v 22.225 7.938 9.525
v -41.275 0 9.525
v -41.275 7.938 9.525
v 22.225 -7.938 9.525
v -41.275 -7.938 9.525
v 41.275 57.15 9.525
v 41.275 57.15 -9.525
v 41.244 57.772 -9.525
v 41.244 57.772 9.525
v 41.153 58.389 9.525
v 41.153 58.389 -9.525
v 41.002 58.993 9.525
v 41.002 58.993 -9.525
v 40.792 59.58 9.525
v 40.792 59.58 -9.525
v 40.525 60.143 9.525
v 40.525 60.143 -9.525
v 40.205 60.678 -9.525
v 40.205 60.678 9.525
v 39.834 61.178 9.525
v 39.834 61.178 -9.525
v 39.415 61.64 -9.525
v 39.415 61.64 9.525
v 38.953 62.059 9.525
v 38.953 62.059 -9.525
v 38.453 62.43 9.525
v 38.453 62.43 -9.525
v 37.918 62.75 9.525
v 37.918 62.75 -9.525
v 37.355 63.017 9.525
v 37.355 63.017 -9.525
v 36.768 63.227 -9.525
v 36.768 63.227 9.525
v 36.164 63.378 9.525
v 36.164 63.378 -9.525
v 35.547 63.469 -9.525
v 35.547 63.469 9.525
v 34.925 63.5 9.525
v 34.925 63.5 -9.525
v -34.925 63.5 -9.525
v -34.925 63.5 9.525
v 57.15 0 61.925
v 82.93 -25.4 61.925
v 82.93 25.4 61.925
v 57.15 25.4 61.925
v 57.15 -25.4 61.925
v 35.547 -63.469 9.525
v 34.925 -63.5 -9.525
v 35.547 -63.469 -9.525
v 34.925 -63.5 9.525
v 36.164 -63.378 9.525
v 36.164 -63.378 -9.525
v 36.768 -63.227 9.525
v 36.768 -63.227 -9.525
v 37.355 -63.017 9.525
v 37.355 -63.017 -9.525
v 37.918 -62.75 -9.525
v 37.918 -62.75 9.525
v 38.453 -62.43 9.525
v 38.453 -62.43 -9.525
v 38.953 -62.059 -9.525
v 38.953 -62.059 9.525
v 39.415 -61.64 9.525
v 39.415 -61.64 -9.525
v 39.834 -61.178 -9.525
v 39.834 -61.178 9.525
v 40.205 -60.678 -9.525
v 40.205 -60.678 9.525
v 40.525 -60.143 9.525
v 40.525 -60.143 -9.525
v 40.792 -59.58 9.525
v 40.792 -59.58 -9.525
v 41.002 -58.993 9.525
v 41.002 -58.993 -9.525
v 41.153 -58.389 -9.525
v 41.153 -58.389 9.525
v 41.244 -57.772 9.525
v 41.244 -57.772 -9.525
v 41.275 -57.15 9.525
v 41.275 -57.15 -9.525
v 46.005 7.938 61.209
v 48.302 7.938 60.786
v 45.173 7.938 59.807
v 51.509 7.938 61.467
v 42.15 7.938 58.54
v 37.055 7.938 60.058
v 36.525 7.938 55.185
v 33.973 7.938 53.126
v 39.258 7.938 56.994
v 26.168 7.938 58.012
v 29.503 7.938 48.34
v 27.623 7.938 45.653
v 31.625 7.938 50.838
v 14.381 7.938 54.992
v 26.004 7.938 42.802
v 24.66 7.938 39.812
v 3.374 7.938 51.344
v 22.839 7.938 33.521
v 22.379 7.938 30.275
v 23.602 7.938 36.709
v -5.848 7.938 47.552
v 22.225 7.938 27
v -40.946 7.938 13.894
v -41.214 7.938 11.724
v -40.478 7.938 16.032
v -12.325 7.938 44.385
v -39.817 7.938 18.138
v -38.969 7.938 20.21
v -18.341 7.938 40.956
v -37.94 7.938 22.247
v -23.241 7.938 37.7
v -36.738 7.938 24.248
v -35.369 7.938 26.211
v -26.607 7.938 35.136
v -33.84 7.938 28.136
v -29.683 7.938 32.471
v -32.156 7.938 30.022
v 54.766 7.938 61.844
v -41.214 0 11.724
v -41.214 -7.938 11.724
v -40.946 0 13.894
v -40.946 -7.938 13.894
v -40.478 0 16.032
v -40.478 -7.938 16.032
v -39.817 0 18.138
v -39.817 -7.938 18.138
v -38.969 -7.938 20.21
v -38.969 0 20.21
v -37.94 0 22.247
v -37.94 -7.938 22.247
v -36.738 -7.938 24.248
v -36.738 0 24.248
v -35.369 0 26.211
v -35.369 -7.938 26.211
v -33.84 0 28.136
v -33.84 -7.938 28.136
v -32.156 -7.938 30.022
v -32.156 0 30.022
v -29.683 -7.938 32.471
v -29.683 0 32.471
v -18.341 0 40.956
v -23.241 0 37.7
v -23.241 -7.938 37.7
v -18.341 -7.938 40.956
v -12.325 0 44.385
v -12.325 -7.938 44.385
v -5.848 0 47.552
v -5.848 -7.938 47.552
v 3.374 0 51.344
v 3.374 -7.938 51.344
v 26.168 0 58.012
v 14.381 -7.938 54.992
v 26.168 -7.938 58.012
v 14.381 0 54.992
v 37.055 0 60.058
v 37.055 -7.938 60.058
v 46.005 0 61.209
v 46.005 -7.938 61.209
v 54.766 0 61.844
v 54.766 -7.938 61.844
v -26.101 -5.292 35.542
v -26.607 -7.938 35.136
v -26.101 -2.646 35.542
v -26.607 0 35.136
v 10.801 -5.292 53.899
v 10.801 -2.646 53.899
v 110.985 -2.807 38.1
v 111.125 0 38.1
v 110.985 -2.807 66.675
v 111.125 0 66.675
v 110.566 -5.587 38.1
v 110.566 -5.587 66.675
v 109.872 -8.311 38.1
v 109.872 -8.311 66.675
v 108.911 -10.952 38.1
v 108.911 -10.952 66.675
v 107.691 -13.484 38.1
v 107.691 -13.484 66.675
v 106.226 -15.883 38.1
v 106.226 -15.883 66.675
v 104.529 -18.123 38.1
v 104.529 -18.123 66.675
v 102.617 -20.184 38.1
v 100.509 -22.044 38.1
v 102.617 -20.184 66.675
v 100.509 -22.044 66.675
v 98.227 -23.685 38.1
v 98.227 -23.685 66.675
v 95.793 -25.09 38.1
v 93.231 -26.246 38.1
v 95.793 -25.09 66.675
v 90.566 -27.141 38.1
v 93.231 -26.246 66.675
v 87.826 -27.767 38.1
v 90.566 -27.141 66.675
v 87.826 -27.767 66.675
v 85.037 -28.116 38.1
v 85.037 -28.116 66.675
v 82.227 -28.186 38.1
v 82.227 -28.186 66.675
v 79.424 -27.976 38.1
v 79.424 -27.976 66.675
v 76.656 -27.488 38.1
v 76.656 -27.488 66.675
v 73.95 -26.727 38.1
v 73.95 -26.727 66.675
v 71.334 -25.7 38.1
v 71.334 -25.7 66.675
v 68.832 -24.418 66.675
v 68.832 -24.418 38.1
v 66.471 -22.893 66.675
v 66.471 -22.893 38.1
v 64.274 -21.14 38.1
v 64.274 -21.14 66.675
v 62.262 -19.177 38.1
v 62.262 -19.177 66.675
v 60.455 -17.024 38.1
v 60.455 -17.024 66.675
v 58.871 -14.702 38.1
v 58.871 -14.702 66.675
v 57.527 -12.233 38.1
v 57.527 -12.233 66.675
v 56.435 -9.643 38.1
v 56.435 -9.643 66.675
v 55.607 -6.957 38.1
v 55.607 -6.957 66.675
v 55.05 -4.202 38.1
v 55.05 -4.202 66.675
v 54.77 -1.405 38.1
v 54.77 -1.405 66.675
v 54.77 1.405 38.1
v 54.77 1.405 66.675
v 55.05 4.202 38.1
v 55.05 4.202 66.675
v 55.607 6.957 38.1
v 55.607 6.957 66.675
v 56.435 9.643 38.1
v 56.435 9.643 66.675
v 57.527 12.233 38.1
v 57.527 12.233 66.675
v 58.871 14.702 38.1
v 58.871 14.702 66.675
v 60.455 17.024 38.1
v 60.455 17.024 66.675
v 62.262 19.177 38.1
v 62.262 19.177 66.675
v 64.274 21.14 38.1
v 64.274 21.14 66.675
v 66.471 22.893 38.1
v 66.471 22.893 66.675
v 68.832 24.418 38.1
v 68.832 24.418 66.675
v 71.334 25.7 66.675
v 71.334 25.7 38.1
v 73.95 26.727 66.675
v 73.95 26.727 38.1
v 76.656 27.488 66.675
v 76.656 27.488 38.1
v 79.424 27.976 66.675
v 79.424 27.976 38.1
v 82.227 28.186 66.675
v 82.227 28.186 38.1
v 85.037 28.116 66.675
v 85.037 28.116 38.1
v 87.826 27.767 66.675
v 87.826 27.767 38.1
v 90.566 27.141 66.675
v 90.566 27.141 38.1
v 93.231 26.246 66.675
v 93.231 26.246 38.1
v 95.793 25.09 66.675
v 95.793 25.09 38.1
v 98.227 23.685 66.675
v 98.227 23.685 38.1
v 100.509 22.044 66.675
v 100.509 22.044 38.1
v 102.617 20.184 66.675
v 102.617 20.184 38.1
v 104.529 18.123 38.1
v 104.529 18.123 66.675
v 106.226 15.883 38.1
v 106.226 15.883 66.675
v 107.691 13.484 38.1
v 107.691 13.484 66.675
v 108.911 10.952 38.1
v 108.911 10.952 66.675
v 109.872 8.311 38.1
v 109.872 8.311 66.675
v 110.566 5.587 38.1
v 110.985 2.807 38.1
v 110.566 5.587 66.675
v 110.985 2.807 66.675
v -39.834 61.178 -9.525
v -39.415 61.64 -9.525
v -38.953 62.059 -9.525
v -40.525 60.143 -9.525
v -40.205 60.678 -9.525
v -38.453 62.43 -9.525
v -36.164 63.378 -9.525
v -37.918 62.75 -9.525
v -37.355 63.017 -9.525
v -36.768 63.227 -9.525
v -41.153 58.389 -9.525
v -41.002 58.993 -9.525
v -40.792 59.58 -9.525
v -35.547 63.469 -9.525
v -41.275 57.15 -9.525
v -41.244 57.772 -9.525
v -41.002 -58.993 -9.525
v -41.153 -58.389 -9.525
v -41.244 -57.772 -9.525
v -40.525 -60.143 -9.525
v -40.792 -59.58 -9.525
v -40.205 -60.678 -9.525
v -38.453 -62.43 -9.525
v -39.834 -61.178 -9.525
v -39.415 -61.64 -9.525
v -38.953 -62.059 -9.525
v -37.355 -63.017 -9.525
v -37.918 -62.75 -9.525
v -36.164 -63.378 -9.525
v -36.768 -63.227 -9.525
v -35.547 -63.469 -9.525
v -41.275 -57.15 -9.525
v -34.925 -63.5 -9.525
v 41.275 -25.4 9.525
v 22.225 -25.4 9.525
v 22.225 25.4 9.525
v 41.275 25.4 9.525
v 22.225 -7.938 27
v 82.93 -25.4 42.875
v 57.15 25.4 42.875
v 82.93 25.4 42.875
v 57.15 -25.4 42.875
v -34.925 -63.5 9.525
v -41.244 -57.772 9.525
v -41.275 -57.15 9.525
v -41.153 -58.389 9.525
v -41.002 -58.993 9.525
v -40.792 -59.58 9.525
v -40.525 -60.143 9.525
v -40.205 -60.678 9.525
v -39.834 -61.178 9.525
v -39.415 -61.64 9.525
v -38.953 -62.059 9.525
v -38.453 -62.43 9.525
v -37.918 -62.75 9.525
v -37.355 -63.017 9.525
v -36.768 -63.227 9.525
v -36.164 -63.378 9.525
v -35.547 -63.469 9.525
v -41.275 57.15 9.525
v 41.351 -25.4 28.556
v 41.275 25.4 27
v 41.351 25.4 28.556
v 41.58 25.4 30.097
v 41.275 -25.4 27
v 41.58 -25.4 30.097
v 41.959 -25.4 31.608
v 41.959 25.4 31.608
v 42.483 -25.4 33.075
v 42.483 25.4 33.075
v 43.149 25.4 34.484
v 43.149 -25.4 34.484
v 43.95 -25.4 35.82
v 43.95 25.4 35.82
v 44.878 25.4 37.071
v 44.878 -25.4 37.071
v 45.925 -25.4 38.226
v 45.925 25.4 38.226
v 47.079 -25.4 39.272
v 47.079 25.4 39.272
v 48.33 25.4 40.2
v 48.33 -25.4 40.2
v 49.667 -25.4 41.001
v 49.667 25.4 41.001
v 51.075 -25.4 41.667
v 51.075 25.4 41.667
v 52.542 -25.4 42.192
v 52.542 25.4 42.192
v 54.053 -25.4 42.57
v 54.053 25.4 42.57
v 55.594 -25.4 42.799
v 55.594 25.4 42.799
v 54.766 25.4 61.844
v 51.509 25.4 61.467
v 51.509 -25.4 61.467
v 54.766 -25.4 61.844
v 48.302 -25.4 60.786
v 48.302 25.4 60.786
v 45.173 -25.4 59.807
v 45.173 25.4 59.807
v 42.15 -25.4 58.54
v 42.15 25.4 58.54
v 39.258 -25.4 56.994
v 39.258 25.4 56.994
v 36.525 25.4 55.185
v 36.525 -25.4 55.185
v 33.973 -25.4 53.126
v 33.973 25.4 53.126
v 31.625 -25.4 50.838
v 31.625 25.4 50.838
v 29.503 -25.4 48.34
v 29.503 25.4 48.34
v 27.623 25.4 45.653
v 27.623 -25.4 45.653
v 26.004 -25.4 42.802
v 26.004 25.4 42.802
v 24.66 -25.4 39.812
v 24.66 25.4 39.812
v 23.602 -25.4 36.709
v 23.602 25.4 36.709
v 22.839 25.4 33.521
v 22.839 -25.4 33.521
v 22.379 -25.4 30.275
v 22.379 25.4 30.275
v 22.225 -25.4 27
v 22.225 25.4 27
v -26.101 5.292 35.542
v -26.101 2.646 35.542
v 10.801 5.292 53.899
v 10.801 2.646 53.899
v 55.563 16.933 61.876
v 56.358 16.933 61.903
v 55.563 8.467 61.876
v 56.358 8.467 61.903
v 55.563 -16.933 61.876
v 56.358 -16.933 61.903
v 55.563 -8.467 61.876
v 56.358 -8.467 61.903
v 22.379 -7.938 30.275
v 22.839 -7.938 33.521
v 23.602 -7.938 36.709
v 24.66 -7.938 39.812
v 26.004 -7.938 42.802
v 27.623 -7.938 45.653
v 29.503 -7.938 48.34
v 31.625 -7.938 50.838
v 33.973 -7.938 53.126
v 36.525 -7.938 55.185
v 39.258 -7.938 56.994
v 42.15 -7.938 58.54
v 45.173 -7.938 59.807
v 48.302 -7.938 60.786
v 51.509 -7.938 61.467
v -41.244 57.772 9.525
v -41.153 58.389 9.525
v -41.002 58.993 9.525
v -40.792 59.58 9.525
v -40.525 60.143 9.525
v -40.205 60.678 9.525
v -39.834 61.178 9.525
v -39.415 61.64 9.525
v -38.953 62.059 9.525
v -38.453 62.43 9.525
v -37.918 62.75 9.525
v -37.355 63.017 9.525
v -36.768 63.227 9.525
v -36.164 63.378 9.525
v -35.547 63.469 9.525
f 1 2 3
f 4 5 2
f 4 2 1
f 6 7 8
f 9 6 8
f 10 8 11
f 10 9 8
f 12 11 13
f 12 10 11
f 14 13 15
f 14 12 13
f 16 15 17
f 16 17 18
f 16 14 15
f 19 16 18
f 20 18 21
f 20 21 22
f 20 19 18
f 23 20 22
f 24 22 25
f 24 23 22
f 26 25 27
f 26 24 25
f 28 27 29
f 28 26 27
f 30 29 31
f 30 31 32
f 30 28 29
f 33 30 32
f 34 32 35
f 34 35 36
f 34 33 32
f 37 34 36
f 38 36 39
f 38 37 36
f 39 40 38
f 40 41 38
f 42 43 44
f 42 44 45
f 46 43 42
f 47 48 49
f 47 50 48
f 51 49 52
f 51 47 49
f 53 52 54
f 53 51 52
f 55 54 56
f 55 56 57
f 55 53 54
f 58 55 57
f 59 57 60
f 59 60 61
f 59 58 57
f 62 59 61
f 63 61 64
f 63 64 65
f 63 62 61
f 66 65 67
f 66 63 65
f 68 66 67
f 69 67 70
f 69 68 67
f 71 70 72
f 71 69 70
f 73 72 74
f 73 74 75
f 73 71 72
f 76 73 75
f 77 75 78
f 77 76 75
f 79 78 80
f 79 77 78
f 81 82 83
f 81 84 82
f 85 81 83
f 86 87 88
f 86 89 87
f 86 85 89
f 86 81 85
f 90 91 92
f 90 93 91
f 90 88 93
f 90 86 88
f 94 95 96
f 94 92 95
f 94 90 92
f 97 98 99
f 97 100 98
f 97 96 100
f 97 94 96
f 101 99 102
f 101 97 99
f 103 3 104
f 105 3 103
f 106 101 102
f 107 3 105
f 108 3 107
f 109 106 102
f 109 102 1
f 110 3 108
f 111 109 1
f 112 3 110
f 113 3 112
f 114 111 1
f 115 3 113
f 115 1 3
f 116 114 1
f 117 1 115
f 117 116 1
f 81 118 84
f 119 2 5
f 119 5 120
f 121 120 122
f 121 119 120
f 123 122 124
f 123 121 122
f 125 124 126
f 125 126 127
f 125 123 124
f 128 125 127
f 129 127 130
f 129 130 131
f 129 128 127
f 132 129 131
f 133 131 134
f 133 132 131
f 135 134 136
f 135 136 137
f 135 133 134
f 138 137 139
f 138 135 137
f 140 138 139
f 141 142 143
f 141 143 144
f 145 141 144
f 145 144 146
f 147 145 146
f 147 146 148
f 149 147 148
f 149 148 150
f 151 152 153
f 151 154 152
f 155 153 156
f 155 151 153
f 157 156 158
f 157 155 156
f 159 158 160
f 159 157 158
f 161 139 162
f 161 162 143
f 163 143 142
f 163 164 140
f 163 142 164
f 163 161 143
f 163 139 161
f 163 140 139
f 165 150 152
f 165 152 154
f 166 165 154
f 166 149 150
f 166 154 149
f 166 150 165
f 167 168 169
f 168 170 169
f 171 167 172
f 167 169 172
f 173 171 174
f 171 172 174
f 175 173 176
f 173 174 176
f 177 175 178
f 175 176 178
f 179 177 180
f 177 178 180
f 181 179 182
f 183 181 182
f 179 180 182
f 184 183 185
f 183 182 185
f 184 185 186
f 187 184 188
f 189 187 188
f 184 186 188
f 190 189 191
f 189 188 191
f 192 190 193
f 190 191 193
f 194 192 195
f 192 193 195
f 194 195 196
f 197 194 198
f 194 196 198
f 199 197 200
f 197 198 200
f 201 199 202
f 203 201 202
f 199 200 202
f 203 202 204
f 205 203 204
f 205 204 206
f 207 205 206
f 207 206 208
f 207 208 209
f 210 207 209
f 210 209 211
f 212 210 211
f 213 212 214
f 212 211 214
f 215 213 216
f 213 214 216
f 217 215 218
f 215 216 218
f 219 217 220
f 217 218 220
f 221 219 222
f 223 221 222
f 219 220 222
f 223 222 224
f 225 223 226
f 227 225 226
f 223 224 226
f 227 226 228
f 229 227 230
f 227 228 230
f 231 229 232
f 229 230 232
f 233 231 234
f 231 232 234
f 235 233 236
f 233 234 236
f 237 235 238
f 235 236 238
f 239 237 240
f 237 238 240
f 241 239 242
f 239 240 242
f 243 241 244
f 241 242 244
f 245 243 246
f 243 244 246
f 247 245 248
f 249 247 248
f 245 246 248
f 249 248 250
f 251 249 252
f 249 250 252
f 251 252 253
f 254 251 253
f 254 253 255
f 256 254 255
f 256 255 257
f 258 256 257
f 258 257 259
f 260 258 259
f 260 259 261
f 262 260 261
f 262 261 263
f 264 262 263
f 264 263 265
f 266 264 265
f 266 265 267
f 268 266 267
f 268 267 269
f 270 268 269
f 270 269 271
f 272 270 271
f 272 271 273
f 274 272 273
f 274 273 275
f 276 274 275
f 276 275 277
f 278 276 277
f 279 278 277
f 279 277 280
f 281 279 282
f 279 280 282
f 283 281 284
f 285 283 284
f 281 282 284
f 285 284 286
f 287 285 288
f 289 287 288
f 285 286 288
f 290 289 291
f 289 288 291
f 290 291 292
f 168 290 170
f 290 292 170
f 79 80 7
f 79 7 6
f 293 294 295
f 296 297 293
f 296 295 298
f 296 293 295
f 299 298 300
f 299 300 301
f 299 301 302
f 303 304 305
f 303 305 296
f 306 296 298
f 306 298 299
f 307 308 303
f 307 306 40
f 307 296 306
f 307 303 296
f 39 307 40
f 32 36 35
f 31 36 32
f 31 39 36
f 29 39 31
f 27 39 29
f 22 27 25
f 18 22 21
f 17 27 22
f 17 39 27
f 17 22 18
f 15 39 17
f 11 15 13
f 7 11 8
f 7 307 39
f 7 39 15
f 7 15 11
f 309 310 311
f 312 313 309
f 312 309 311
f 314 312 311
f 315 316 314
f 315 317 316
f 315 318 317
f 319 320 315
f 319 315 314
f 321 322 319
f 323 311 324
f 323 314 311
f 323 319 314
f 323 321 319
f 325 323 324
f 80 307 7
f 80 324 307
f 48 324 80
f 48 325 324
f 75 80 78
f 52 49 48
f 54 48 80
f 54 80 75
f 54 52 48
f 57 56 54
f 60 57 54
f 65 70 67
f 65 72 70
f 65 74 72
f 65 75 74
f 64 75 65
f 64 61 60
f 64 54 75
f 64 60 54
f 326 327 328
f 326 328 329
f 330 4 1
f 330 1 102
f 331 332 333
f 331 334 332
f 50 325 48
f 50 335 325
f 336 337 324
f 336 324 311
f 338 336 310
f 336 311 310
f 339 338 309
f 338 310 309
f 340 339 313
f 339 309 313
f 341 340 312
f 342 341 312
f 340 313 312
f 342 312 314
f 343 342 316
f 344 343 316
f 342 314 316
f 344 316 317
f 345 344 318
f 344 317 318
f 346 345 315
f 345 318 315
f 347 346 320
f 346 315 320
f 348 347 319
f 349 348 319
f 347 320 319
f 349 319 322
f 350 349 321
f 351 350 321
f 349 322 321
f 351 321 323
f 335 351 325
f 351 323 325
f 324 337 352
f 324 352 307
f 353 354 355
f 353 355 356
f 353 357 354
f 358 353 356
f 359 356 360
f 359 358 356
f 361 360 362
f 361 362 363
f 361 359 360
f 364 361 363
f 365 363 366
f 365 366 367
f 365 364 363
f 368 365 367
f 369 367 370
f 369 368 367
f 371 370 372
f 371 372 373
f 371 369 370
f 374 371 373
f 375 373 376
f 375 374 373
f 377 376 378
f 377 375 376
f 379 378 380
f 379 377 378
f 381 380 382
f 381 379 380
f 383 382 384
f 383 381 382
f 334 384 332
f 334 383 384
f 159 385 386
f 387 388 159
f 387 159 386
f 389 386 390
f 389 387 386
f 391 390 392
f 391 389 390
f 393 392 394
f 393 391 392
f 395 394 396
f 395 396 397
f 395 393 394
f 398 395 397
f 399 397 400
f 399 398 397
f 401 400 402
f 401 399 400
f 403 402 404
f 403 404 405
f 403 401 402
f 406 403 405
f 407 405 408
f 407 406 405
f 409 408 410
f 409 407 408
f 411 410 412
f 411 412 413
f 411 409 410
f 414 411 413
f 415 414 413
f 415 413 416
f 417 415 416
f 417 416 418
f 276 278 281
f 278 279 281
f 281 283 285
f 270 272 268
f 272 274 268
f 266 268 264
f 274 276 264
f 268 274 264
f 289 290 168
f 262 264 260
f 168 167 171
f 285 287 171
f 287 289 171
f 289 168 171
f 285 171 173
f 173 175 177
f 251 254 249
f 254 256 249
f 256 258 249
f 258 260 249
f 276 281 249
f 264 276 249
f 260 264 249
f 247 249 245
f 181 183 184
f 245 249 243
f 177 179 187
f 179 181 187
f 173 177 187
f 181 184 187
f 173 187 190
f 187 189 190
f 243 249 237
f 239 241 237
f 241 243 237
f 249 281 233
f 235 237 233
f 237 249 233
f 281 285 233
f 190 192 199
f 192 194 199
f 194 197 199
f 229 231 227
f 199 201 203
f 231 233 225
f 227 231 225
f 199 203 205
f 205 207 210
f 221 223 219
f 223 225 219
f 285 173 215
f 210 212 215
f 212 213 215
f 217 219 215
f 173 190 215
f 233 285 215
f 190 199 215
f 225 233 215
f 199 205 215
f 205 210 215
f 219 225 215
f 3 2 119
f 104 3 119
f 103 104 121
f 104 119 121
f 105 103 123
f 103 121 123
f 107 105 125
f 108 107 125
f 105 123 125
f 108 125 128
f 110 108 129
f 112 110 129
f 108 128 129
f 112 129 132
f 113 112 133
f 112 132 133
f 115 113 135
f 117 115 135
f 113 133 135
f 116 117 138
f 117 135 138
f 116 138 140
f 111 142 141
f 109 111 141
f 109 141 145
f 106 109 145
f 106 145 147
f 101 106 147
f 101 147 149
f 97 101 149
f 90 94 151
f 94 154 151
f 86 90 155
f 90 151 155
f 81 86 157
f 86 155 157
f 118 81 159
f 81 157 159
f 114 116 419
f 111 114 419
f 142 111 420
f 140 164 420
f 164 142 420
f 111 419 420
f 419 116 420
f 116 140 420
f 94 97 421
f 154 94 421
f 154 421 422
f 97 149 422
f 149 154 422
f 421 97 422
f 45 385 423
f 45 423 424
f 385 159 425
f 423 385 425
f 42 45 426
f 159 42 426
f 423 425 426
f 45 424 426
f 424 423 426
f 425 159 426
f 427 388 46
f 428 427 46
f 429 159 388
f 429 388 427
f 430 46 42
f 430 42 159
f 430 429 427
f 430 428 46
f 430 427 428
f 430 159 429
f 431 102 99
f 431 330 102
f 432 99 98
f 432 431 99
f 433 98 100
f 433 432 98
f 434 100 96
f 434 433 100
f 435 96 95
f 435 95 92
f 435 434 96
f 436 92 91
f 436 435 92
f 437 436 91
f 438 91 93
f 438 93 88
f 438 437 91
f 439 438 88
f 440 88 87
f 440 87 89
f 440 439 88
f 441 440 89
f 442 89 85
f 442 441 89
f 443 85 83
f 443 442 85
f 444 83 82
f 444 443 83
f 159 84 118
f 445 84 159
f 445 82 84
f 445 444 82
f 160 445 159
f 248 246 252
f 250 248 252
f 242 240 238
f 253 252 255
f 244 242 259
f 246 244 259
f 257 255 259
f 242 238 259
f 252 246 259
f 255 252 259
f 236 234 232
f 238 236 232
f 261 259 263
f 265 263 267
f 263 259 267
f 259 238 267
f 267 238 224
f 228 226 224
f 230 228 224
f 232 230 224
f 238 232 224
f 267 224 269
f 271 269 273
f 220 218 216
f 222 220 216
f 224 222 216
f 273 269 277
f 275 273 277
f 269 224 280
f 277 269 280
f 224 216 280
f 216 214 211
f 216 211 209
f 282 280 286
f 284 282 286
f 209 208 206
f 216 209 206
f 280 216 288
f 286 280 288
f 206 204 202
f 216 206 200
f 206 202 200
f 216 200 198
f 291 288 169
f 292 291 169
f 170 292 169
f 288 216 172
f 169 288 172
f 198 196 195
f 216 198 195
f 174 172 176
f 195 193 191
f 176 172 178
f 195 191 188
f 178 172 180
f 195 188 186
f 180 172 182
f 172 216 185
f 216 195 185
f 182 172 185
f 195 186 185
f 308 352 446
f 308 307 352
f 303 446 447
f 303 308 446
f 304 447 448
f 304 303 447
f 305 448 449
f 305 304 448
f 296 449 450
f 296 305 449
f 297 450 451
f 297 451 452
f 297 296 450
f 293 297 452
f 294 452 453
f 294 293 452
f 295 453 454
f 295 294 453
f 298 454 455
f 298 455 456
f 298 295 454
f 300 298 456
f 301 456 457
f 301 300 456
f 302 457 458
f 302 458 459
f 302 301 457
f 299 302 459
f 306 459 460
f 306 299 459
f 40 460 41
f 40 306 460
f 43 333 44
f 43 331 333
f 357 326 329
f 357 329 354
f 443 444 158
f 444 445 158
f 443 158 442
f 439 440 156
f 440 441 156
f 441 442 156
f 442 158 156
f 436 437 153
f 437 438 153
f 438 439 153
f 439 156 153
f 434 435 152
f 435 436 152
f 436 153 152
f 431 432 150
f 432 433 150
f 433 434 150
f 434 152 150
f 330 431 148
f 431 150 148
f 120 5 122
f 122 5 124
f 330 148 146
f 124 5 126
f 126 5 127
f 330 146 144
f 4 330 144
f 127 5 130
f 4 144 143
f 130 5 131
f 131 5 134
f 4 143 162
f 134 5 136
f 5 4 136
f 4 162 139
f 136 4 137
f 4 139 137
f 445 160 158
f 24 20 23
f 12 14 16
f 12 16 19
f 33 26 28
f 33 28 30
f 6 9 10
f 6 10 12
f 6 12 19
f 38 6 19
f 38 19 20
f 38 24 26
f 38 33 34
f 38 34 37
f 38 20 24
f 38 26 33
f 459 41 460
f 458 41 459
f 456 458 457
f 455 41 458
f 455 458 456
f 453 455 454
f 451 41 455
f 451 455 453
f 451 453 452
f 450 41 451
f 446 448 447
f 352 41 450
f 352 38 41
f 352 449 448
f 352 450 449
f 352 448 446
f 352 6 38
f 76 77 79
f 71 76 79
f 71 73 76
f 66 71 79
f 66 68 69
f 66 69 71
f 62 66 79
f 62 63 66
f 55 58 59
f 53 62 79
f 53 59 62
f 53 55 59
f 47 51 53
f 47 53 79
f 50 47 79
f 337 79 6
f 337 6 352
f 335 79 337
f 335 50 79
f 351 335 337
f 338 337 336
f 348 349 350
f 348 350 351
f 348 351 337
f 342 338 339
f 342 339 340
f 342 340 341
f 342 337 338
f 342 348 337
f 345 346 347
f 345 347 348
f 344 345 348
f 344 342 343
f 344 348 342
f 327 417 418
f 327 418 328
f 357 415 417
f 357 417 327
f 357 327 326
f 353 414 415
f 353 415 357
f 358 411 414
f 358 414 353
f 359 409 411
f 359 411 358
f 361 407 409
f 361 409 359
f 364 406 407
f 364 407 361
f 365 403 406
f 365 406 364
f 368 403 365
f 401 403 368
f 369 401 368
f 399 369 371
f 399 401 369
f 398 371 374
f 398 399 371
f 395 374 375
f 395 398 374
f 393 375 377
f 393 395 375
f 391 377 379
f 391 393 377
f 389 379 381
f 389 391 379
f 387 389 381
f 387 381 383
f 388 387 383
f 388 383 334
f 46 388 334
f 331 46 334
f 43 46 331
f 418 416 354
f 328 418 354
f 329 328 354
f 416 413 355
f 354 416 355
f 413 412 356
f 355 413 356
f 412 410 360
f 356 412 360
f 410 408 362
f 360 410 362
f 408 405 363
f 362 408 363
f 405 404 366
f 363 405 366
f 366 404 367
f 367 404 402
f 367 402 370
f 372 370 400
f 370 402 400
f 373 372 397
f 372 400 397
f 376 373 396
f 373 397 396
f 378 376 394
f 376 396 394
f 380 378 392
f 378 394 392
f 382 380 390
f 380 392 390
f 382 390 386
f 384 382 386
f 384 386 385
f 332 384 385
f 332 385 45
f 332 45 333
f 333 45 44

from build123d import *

# Parameters (mm, degrees)
F1_DEPTH = 63.5
F0_W     = 22.604974729
F0_H     = 19.05
F2_DEPTH = 25.4
F3_DEPTH = 7.9375
F5_R     = 6.35


with BuildPart() as f1:
    # F0 (on Front) → F1 (new body, symmetric)
    with BuildSketch(Plane.XZ):
        Polygon((-41.275, -9.525), (41.275, -9.525), (41.275, 9.525), (22.225, 9.525), (-41.275, 9.525), align=None)
    extrude(amount=F1_DEPTH, both=True)

    # F5
    f5_edges = [f1.edges().sort_by_distance(p)[0] for p in [
        (-41.275, -63.5, 0),
        (-41.275, 63.5, 0),
        (41.275, 63.5, 0),
        (41.275, -63.5, 0),
    ]]
    fillet(f5_edges, radius=F5_R)


with BuildPart() as f2:
    # F0 (on Front) → F2 (new body, symmetric)
    with BuildSketch(Plane.XZ):
        with Locations((71.6274873645, 52.4002)):
            Rectangle(F0_W, F0_H)
        with BuildLine():
            Line((22.225, 9.525), (41.275, 9.525))
            Line((41.275, 9.525), (41.275, 27.0002))
            ThreePointArc((41.275, 27.0002), (45.9246798487, 38.2255201513), (57.15, 42.8752))
            Line((57.15, 42.8752), (60.325, 42.8752))
            Line((60.325, 42.8752), (60.325, 61.9252))
            Line((60.325, 61.9252), (57.15, 61.9252))
            add(Edge.make_bspline(
                [(54.7657787961, 61.8437232755), (55.5646724331, 61.8778522086), (56.3595578229, 61.9050383377), (57.15, 61.9252)],
                knots=[109.4523374969, 109.4523374969, 109.4523374969, 109.4523374969, 111.5045361635, 111.5045361635, 111.5045361635, 111.5045361635], degree=3))
            ThreePointArc((54.7657787961, 61.8437232755), (31.6252615043, 50.8380553928), (22.225, 27.0002))
            Line((22.225, 27.0002), (22.225, 9.525))
        make_face()
    extrude(amount=F2_DEPTH, both=True)


with BuildPart() as f3:
    # F0 (on Front) → F3 (new body, symmetric)
    with BuildSketch(Plane.XZ):
        with BuildLine():
            add(Edge.make_bspline(
                [(-41.275, 9.525), (-41.8524980669, 38.4541969798), (12.1574400412, 60.0234845422), (54.7657787961, 61.8437232755)],
                knots=[0, 0, 0, 0, 109.4523374969, 109.4523374969, 109.4523374969, 109.4523374969], degree=3))
            Line((-41.275, 9.525), (22.225, 9.525))
            Line((22.225, 9.525), (22.225, 27.0002))
            ThreePointArc((22.225, 27.0002), (31.6252615043, 50.8380553928), (54.7657787961, 61.8437232755))
        make_face()
    extrude(amount=F3_DEPTH, both=True)


with BuildPart() as f4:
    # F0 (on Front) → F4 (revolve)
    with BuildSketch(Plane.XZ):
        Polygon((82.929974729, 61.9252), (82.929974729, 42.8752), (82.929974729, 38.1000029986), (111.125, 38.1000029986), (111.125, 66.6750029986), (82.929974729, 66.6750029986), align=None)
    revolve(axis=Axis((82.929974729, 0, 52.4002), (0, 0, -1)))


solid = Compound([f1.part, f2.part, f3.part, f4.part])
